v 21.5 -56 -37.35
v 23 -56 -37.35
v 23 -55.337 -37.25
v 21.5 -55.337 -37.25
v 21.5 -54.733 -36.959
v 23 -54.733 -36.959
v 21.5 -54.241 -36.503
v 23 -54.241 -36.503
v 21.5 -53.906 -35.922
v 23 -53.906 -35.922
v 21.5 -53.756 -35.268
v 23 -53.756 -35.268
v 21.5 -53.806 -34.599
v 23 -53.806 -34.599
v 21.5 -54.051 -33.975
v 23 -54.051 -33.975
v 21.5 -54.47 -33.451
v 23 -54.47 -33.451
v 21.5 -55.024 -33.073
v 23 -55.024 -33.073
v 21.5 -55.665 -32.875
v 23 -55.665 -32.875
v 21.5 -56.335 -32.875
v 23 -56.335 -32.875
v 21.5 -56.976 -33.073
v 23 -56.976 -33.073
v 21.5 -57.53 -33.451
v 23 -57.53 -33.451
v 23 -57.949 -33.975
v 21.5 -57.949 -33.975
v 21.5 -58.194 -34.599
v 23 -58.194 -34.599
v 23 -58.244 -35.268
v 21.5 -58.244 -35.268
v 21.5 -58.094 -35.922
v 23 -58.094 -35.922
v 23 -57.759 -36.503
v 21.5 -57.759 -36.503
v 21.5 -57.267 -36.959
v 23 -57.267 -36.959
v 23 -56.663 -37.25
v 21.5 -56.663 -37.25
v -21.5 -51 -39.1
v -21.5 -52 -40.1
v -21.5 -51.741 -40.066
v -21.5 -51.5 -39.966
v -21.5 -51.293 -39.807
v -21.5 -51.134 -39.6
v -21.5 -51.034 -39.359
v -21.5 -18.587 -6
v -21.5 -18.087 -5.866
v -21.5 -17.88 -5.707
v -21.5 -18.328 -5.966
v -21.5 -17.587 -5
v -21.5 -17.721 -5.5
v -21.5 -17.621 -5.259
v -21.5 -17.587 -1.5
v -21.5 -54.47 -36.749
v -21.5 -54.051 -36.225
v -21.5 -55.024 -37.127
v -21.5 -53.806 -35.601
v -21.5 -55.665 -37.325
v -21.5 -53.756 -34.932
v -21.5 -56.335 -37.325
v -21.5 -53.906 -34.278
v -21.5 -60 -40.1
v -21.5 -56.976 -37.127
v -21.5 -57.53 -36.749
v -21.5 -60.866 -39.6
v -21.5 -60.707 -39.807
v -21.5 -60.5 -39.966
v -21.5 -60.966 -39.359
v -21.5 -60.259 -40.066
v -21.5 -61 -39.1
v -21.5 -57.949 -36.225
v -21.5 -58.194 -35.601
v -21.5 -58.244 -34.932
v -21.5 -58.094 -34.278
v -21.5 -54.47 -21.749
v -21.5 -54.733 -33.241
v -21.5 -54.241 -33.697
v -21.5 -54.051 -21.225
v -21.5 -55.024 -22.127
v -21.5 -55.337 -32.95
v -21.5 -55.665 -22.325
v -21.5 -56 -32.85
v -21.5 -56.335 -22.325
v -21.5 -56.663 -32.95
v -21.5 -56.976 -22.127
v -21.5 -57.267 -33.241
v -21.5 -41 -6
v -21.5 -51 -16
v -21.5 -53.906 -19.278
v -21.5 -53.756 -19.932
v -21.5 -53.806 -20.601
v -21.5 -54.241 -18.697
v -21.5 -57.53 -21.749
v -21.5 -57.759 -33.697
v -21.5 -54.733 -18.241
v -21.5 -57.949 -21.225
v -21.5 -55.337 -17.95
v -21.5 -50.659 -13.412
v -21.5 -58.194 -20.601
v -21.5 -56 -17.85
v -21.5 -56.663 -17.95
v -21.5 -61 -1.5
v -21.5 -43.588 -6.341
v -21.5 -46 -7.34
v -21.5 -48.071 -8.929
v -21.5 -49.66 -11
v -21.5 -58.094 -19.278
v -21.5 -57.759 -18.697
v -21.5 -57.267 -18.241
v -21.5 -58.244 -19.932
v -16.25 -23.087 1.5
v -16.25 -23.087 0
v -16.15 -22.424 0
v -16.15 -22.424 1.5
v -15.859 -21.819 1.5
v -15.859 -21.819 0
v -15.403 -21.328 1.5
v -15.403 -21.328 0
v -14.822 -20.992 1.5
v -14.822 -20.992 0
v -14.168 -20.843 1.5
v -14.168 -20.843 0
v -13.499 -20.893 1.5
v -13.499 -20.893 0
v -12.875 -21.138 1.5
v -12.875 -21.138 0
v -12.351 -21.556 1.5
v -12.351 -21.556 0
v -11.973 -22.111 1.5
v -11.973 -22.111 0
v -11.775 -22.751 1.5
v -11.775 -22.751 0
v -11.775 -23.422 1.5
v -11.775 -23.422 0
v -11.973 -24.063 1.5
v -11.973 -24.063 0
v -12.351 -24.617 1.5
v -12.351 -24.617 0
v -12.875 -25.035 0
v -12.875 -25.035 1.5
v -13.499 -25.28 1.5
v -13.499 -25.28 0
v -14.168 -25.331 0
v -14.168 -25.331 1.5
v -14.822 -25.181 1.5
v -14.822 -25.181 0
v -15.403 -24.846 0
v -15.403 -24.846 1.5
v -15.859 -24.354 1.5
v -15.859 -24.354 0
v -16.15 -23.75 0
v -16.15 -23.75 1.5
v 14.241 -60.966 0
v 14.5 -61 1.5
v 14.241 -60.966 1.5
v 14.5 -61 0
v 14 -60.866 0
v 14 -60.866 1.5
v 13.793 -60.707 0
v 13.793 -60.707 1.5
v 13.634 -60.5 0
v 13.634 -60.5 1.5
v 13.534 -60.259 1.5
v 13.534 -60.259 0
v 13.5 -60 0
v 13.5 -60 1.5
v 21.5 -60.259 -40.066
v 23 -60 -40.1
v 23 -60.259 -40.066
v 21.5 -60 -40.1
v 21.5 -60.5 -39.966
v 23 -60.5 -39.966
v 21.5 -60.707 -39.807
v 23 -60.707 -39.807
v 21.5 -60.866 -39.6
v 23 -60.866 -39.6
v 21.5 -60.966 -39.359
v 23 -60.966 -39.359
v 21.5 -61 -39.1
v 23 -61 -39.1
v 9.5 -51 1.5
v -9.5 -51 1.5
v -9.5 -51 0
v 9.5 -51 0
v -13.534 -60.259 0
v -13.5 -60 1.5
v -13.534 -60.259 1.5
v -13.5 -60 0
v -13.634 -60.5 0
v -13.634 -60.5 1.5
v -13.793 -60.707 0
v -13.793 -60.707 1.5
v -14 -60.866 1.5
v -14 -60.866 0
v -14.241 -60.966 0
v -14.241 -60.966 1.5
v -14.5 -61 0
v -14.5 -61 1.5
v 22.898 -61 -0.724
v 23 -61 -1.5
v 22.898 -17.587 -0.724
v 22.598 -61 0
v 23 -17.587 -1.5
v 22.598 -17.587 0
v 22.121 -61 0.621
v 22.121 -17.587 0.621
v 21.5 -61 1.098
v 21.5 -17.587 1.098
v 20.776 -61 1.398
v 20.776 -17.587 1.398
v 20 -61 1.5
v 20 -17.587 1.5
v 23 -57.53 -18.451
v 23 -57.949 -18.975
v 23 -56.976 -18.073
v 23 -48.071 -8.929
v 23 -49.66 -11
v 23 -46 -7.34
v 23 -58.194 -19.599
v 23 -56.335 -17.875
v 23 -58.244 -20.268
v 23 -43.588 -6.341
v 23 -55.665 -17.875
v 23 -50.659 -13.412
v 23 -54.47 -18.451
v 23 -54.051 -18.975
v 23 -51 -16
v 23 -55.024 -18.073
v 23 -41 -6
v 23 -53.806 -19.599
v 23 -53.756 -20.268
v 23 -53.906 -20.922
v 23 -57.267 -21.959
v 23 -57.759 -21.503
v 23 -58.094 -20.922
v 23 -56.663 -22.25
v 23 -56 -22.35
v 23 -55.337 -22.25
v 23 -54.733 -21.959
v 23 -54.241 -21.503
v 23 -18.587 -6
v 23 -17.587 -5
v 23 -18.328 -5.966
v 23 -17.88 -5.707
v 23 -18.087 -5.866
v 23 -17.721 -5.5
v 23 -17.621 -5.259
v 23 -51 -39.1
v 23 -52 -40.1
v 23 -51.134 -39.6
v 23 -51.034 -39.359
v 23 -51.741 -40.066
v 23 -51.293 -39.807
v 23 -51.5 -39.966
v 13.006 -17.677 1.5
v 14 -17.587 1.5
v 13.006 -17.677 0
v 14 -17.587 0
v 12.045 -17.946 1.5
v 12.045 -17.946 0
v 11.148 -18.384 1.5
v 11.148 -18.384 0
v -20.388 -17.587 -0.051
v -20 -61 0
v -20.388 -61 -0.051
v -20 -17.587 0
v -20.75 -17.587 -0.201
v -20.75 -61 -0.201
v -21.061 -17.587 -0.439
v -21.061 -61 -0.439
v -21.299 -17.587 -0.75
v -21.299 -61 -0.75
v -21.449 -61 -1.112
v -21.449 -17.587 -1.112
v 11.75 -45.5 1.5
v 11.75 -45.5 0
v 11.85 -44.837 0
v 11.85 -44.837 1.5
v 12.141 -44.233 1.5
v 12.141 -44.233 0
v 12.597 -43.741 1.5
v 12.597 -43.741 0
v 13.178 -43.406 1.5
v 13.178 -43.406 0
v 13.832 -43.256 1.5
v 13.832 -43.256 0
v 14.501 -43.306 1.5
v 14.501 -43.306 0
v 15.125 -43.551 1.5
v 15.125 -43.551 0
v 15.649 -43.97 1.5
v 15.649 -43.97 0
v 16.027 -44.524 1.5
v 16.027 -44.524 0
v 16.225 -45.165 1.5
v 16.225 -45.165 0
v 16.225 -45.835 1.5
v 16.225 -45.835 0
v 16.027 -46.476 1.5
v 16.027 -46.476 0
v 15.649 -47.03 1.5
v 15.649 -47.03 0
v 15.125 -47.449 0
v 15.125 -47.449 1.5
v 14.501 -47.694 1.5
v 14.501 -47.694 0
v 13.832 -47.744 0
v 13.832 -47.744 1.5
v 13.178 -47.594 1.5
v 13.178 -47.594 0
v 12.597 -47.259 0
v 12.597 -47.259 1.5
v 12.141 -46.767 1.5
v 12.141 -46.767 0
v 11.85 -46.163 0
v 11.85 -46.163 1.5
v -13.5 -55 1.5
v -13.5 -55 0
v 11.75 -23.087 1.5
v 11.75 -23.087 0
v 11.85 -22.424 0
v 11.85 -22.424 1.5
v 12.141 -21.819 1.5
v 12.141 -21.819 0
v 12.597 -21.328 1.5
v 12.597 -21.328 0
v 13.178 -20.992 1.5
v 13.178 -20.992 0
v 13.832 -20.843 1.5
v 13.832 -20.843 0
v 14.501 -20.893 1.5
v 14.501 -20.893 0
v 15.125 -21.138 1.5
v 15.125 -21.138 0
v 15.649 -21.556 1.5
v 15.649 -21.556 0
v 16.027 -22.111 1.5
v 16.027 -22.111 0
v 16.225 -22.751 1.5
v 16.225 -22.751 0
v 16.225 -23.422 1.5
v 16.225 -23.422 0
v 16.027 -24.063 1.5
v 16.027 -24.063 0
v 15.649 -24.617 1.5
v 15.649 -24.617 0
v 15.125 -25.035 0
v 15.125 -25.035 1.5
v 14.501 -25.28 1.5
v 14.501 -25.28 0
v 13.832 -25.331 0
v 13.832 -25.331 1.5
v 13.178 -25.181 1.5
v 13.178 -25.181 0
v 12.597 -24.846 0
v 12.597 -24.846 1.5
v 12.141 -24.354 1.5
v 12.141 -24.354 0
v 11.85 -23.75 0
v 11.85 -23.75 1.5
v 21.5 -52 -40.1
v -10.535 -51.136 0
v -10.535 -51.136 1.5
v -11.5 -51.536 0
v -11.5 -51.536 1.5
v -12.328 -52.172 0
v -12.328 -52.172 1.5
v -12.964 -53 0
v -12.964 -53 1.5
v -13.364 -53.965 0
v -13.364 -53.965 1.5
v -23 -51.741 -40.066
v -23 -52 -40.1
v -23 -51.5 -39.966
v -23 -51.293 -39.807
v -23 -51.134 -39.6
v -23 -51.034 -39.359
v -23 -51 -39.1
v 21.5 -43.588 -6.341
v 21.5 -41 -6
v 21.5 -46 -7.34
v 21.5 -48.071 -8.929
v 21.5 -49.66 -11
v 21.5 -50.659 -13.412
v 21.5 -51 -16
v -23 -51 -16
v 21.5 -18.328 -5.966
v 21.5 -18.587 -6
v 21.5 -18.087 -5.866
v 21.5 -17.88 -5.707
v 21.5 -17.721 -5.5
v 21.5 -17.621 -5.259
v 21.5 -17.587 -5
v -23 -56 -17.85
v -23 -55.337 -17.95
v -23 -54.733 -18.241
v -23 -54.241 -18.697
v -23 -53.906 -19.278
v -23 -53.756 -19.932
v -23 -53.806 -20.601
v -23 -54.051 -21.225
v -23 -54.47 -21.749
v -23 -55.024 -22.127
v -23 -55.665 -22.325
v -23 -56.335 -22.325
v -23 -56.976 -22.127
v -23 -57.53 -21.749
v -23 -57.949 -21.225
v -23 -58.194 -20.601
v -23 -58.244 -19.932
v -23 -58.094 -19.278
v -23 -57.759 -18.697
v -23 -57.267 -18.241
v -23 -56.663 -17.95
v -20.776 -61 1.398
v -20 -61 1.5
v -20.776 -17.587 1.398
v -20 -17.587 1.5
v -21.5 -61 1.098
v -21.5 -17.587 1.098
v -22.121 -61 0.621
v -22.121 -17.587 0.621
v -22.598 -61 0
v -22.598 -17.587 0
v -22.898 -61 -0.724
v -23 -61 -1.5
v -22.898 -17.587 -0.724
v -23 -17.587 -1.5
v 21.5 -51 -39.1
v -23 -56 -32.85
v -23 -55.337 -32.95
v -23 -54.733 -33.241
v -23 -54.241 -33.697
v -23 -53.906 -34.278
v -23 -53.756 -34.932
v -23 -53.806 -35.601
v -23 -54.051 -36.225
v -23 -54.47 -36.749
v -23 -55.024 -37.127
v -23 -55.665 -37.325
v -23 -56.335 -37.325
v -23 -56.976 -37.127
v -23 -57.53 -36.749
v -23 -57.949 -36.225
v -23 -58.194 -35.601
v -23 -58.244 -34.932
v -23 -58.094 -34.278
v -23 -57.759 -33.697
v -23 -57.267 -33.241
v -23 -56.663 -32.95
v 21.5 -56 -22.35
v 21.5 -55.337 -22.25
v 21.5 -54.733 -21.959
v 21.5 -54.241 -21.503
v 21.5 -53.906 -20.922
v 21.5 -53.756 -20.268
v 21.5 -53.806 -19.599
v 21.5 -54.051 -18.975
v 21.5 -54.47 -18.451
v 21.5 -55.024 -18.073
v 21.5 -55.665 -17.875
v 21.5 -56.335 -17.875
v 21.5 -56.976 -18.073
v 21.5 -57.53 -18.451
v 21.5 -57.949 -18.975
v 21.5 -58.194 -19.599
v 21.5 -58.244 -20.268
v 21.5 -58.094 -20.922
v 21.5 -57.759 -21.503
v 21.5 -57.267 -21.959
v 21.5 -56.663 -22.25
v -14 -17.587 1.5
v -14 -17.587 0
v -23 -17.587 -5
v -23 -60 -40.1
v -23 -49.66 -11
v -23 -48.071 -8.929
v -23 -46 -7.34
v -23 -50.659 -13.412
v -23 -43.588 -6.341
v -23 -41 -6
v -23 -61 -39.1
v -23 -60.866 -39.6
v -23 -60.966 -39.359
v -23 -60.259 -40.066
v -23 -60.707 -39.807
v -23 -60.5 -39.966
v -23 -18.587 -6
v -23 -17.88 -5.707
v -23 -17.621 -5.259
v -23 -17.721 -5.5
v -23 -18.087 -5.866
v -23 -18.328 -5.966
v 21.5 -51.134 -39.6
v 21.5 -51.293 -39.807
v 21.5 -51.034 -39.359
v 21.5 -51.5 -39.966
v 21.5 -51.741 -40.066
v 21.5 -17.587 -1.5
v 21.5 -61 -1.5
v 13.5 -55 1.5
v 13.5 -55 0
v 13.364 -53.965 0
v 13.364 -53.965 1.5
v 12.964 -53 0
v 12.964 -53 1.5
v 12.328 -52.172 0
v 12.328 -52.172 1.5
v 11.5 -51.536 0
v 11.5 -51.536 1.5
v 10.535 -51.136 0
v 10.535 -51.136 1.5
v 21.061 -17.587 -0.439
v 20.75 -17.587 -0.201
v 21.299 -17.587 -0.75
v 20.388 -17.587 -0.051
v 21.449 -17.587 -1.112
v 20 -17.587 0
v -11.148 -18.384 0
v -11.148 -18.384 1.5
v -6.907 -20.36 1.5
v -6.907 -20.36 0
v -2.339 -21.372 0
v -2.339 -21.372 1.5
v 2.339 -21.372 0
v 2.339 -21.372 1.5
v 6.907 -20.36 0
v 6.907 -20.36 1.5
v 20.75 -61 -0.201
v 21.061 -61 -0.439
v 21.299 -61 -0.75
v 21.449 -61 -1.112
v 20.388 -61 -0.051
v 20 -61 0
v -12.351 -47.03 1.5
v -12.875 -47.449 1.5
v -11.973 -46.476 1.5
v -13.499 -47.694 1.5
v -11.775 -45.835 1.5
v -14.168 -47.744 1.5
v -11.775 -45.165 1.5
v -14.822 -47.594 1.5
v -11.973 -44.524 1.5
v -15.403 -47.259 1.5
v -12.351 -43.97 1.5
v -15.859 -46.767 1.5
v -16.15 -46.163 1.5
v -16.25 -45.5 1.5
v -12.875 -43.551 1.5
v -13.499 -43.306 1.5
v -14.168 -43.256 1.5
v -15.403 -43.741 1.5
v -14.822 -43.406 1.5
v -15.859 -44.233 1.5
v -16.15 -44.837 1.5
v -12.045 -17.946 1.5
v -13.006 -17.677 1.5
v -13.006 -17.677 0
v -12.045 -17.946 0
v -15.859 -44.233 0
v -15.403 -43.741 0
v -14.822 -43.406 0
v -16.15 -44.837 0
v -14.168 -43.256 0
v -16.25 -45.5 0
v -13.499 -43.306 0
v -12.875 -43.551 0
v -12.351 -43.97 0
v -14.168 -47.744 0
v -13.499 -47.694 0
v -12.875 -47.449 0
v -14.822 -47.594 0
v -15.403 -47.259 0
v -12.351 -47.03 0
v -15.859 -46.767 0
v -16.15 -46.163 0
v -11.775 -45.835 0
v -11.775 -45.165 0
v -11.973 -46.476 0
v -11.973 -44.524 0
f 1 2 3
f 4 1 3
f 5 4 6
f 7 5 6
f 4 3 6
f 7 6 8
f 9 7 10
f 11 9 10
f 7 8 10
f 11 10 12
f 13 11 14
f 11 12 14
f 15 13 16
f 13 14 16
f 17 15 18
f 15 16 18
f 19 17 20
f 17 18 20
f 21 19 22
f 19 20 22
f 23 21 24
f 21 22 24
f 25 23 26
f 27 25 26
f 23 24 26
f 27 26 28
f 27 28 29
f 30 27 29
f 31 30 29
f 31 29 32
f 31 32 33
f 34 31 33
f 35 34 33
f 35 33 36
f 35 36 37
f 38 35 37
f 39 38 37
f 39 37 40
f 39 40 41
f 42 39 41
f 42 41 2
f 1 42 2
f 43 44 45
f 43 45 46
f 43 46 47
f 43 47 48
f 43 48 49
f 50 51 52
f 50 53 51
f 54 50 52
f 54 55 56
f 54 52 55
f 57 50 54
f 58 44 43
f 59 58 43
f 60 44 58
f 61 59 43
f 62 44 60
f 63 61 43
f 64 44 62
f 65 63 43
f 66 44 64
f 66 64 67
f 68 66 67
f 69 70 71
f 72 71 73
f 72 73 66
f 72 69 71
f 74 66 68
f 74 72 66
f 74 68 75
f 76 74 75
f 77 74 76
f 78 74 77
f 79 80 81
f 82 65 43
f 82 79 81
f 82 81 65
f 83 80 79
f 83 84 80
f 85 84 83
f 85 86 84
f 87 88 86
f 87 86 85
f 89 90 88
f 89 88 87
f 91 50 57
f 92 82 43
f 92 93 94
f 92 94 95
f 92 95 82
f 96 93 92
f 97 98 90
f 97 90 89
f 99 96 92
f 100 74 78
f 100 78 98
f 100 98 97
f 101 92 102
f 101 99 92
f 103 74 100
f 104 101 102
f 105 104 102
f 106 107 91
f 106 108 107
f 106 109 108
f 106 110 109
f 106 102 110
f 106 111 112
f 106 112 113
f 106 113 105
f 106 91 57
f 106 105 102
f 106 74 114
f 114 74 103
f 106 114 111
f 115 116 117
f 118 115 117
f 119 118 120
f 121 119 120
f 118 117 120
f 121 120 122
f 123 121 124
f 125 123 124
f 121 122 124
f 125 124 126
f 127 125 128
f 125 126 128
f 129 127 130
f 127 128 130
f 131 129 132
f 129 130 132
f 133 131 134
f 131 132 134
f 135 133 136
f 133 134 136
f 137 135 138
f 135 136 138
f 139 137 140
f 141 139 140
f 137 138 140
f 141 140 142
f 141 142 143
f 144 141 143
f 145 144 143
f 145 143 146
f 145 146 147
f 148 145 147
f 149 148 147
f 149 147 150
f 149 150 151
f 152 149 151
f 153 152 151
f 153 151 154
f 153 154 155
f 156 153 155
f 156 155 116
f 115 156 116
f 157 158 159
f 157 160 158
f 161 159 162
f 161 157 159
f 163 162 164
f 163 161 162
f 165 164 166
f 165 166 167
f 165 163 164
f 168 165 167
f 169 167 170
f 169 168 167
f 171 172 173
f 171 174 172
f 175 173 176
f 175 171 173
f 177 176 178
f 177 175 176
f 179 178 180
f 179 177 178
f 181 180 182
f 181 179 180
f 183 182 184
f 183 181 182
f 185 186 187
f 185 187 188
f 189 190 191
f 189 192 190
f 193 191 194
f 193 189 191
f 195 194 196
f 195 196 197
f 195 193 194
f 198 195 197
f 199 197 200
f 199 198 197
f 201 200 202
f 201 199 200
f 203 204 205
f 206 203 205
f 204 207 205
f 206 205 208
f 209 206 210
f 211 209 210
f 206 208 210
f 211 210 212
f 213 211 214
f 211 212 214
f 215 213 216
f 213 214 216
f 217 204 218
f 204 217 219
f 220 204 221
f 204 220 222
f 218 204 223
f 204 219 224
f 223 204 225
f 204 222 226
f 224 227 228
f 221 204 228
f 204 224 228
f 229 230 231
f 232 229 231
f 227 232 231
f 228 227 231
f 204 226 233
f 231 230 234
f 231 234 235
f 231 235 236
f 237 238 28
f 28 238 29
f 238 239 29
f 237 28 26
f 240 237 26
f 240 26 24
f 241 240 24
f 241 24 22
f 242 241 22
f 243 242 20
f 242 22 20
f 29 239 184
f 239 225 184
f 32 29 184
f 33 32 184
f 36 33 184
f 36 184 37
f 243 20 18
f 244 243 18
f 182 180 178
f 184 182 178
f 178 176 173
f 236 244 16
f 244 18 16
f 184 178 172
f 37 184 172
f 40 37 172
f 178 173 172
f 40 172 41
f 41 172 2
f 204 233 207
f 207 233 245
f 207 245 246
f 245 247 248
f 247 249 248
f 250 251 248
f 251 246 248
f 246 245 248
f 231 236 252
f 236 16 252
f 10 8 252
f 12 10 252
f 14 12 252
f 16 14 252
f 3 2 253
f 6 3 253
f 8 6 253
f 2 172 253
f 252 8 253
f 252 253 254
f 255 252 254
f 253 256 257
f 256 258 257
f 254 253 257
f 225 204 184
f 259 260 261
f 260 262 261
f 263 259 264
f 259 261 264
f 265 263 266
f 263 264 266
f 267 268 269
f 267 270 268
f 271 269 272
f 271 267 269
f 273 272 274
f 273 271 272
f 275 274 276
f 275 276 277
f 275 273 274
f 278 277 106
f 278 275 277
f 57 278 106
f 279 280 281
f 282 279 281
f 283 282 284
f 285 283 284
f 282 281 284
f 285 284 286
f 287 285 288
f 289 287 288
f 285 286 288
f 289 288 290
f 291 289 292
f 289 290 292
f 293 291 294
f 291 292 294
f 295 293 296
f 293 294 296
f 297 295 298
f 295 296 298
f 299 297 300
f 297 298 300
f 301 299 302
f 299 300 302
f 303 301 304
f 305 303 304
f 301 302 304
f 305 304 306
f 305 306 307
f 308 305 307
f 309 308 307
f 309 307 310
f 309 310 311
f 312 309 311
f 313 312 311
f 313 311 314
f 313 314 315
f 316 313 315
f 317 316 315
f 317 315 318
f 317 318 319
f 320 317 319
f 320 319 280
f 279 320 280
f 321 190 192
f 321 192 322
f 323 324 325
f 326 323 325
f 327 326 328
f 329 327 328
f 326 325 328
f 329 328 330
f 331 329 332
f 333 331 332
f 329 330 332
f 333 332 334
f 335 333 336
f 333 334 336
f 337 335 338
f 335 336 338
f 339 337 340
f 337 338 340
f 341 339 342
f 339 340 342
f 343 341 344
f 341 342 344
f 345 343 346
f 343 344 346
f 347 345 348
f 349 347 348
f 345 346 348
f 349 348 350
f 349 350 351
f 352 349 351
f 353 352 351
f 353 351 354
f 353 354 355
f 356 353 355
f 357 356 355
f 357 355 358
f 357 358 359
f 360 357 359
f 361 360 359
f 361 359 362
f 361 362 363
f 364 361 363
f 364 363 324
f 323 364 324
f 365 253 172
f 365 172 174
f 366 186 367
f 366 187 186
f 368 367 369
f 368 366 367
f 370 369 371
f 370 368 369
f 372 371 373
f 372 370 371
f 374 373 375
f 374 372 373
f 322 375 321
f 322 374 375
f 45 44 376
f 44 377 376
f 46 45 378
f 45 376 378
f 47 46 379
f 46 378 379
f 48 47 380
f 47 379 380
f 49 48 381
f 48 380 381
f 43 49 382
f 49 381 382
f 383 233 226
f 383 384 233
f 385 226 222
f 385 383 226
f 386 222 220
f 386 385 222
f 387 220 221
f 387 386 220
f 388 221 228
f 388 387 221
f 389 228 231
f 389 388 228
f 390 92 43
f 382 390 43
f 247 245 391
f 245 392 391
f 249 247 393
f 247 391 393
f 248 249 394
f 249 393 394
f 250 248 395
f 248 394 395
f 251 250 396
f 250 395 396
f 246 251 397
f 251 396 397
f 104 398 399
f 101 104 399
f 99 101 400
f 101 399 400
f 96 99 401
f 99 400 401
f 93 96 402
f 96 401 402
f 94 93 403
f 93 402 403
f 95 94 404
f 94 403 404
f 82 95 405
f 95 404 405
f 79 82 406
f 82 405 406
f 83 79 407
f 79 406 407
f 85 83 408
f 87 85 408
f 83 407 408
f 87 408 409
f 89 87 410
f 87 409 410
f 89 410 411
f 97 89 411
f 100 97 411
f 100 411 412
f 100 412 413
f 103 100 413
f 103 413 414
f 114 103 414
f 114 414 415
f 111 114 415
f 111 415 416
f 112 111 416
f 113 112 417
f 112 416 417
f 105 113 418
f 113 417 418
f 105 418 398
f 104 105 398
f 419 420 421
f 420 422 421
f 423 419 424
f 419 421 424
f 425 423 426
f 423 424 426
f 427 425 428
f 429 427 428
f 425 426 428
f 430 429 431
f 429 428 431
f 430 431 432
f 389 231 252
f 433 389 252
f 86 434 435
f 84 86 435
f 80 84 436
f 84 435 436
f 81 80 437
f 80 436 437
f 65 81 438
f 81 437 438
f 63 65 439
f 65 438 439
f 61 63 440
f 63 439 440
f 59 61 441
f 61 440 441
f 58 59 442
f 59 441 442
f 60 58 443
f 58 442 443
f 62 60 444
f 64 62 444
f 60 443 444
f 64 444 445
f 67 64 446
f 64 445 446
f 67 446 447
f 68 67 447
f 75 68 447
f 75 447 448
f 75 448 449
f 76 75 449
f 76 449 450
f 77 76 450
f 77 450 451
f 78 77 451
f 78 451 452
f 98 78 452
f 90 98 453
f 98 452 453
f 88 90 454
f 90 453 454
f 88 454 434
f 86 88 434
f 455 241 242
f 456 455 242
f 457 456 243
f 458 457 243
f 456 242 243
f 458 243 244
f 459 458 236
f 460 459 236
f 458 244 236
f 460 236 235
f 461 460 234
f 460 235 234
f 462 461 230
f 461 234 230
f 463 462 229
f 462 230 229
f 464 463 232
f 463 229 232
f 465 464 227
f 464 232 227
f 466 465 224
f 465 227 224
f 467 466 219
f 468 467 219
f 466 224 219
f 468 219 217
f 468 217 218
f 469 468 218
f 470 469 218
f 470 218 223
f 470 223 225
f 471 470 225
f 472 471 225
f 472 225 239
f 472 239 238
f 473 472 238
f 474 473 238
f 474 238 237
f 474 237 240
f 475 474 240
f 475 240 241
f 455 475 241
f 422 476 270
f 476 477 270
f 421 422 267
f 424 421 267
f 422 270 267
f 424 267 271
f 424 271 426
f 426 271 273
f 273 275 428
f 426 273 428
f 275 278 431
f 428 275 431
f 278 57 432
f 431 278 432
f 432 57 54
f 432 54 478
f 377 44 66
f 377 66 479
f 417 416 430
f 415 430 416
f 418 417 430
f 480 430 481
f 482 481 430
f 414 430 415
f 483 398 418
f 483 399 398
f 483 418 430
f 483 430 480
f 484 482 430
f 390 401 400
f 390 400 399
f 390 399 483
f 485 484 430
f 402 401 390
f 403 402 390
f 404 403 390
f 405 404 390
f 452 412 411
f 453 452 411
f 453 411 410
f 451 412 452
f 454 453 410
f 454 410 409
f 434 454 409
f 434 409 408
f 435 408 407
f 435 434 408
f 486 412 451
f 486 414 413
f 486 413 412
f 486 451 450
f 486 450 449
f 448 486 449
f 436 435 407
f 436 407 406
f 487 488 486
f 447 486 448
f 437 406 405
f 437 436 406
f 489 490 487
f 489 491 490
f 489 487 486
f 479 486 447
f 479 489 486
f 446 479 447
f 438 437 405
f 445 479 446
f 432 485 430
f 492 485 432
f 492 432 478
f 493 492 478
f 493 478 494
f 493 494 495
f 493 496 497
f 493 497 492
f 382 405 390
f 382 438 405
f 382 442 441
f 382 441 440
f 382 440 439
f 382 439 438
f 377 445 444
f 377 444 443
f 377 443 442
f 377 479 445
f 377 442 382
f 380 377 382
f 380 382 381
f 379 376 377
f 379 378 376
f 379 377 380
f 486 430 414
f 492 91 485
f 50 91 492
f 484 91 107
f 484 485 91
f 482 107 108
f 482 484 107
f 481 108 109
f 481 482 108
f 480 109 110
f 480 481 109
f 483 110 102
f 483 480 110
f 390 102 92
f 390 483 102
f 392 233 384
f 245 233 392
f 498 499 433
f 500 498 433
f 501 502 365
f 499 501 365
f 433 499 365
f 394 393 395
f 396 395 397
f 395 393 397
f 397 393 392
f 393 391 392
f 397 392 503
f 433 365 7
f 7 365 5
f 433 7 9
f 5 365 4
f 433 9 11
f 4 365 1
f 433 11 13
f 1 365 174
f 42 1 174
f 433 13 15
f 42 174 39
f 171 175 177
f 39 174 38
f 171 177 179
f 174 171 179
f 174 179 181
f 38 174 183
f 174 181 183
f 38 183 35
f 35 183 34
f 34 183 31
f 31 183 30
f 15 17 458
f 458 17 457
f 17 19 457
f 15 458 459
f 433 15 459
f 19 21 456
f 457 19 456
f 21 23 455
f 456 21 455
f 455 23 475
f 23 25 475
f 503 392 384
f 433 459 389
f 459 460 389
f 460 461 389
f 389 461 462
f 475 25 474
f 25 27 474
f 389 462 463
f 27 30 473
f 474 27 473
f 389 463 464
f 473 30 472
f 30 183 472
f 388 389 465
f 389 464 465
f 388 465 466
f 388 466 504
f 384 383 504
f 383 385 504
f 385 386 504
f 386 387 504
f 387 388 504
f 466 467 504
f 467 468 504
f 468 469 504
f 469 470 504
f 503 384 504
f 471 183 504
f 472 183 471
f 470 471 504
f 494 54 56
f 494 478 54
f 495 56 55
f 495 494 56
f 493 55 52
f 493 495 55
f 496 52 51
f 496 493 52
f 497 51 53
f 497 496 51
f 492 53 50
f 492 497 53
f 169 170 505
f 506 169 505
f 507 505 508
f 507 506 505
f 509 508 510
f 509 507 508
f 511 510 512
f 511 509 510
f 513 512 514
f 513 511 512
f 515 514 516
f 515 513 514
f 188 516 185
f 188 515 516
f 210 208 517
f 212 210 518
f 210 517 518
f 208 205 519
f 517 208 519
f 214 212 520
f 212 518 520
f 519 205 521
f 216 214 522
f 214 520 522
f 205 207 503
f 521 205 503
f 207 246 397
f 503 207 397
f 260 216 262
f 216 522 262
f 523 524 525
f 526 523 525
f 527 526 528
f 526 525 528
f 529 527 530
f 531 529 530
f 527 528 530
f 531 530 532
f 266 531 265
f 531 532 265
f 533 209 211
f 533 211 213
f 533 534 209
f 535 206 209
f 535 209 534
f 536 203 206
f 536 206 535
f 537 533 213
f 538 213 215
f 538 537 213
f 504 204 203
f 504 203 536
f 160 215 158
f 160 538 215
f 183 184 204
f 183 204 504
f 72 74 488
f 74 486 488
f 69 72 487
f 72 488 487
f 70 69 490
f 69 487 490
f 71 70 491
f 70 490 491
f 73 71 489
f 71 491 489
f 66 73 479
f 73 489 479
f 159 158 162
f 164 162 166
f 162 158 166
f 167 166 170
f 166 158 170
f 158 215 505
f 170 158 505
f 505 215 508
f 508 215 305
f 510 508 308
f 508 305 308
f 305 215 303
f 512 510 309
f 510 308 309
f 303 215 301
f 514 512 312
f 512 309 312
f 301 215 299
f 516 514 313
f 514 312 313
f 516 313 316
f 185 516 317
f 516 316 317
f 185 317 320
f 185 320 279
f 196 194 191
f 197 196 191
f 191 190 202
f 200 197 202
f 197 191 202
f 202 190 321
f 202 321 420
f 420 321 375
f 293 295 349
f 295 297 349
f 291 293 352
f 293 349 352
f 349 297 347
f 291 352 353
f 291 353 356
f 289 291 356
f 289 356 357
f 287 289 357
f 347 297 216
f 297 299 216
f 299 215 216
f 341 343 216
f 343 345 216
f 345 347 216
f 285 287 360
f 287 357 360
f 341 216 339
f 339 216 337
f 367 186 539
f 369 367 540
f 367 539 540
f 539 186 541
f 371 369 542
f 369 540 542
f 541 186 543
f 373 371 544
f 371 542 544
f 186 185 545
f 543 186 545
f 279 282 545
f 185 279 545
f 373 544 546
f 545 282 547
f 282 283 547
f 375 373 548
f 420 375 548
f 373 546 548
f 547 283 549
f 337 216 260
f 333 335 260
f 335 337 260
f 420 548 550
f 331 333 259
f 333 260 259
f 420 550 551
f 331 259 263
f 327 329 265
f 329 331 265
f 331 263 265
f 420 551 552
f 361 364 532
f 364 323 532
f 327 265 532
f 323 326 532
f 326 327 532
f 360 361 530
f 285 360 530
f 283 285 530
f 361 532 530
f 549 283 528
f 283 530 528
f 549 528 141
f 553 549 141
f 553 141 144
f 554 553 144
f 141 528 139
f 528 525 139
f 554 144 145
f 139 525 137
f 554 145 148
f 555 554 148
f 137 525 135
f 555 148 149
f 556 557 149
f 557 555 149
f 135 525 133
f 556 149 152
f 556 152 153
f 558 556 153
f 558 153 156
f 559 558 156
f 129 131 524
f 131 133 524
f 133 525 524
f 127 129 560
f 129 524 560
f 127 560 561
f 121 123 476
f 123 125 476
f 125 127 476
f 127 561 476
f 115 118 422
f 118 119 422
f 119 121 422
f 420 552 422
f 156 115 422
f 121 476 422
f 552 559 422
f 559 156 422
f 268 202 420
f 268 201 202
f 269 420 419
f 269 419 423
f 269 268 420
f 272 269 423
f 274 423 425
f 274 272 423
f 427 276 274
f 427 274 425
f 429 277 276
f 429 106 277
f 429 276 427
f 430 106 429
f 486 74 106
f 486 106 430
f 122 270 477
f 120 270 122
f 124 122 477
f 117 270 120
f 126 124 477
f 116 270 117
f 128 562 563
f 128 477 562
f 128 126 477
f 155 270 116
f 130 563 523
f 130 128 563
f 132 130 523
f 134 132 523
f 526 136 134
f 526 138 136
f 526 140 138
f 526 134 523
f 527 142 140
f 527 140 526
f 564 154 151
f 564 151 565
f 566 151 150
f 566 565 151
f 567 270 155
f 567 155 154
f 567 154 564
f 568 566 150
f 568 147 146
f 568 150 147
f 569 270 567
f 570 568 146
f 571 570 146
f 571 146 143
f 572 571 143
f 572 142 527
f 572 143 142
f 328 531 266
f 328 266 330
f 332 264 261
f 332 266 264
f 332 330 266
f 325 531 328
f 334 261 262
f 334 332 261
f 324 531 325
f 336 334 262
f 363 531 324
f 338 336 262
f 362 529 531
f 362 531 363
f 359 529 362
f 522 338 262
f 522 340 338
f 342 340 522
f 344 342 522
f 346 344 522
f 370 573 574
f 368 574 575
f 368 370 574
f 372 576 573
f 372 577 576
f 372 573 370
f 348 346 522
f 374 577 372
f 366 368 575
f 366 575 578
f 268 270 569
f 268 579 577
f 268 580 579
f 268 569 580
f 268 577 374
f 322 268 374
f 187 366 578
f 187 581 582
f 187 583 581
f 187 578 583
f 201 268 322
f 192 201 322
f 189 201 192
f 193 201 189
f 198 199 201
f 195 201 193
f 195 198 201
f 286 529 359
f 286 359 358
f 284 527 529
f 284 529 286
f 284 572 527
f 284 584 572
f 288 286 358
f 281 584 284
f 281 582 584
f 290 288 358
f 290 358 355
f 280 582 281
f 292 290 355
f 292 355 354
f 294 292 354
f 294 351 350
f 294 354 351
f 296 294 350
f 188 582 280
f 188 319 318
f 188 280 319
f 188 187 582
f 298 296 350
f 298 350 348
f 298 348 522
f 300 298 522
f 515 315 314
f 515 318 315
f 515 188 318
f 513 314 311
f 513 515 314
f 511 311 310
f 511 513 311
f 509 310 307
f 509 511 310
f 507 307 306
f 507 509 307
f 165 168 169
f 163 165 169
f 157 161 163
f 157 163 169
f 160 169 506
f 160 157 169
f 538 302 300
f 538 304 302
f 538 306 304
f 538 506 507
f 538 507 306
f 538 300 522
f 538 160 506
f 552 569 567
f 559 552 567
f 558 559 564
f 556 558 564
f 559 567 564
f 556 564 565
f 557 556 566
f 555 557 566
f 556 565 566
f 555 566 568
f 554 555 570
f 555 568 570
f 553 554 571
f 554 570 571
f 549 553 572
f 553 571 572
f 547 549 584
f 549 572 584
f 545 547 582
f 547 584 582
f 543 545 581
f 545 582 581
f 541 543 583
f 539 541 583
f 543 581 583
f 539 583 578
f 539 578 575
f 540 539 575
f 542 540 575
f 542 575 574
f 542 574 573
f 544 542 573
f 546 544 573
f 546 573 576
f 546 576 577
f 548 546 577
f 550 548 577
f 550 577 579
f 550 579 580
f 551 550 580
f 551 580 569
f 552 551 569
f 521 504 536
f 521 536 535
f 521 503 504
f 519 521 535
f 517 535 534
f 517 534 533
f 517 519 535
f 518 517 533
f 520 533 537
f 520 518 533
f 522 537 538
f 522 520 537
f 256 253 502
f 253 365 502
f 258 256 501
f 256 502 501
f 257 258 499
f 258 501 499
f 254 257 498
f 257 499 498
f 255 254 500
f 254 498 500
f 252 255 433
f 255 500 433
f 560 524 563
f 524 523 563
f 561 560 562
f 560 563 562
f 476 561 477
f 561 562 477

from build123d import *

# Parameters (mm, degrees)
SKETCH_1_W                  = 46
SKETCH_1_H                  = 43.413207239
EXTRUDE_1_DEPTH             = 41.6
SKETCH_2_W                  = 43
SKETCH_2_H                  = 40.1
CUT_EXTRUDE_1_DEPTH         = 64.417005312
SKETCH_3_W                  = 27
SKETCH_3_H                  = 10
CUT_EXTRUDE_2_DEPTH         = 78.334080456
SKETCH_4_W                  = 34.1
SKETCH_4_H                  = 33.413207239
CUT_EXTRUDE_3_DEPTH         = 86.49421033
SKETCH_5_W                  = 34.1
SKETCH_5_H                  = 33.413207239
CUT_EXTRUDE_4_DEPTH         = 87.284471372
CUT_EXTRUDE_5_DEPTH         = 78.334080456
HOLE_WIZARD_4_5_4_5_1_D     = 4.5
HOLE_WIZARD_4_5_4_5_1_DEPTH = 1.5
HOLE_WIZARD_4_5_4_5_2_D     = 4.5
HOLE_WIZARD_4_5_4_5_3_D     = 4.5
HOLE_WIZARD_4_5_4_5_3_DEPTH = 41.6
FILLET_1_R                  = 1
FILLET_2_R                  = 1.5
FILLET_3_R                  = 3
FILLET_4_R                  = 4
FILLET_5_R                  = 5.5
FILLET_6_R                  = 10


with BuildPart() as part:
    # 草图1 → 凸台-拉伸1 (new body)
    with BuildSketch(Plane(origin=(0, 0, -40.1), x_dir=(-1, 0, 0), z_dir=(0, 0, -1))):
        with Locations((0, -39.293396381)):
            Rectangle(SKETCH_1_W, SKETCH_1_H)
    extrude(amount=-EXTRUDE_1_DEPTH)

    # 草图2 → 切除-拉伸1 (cut, through all)
    with BuildSketch(Plane.XZ.offset(61)):
        with Locations((0, -20.05)):
            Rectangle(SKETCH_2_W, SKETCH_2_H)
    extrude(amount=-CUT_EXTRUDE_1_DEPTH, mode=Mode.SUBTRACT)

    # 草图3 → 切除-拉伸2 (cut, through all)
    with BuildSketch(Plane.XY.offset(1.5)):
        with Locations((0, -56)):
            Rectangle(SKETCH_3_W, SKETCH_3_H)
    extrude(amount=-CUT_EXTRUDE_2_DEPTH, mode=Mode.SUBTRACT)

    # 草图4 → 切除-拉伸3 (cut, through all)
    with BuildSketch(Plane(origin=(-21.5, 0, 0), x_dir=(0, 0, -1), z_dir=(1, 0, 0))):
        with Locations((23.05, -34.29339638)):
            Rectangle(SKETCH_4_W, SKETCH_4_H)
    extrude(amount=-CUT_EXTRUDE_3_DEPTH, mode=Mode.SUBTRACT)

    # 草图5 → 切除-拉伸4 (cut, through all)
    with BuildSketch(Plane(origin=(23, 0, 0), x_dir=(0, 0, -1), z_dir=(1, 0, 0))):
        with Locations((23.05, -34.29339638)):
            Rectangle(SKETCH_5_W, SKETCH_5_H)
    extrude(amount=-CUT_EXTRUDE_4_DEPTH, mode=Mode.SUBTRACT)

    # 草图6 → 切除-拉伸5 (cut, through all)
    with BuildSketch(Plane.XY.offset(1.5)):
        with BuildLine():
            Line((12.367486421, -17.586792761), (-12.367486421, -17.586792761))
            ThreePointArc((-12.367486421, -17.586792761), (0, -21.5), (12.367486421, -17.586792761))
        make_face()
    extrude(amount=-CUT_EXTRUDE_5_DEPTH, mode=Mode.SUBTRACT)

    # Ø4.5 (4.5) 直径孔1
    with Locations(Plane(origin=(-21.5, 0, 0), x_dir=(0, 0, -1), z_dir=(1, 0, 0))):
        with Locations((20.1, -56), (35.1, -56)):
            Hole(HOLE_WIZARD_4_5_4_5_1_D / 2, depth=HOLE_WIZARD_4_5_4_5_1_DEPTH)

    # Ø4.5 (4.5) 直径孔2 (through all)
    with Locations(Plane.ZY.offset(-21.5)):
        with Locations((-20.1, -56), (-35.1, -56)):
            Hole(HOLE_WIZARD_4_5_4_5_2_D / 2)

    # Ø4.5 (4.5) 直径孔3
    with Locations(Plane.XY.offset(1.5)):
        with Locations((-14, -45.5), (-14, -23.086792761), (14, -23.086792761), (14, -45.5)):
            Hole(HOLE_WIZARD_4_5_4_5_3_D / 2, depth=HOLE_WIZARD_4_5_4_5_3_DEPTH)

    # 圆角1
    fillet_1_edges = [part.edges().sort_by_distance(p)[0] for p in [
        (-22.25, -61, -40.1),
        (-13.5, -61, 0.75),
        (13.5, -61, 0.75),
        (22.25, -61, -40.1),
        (-22.25, -51, -40.1),
        (-22.25, -17.586792761, -6),
        (22.25, -51, -40.1),
        (22.25, -17.586792761, -6),
    ]]
    fillet(fillet_1_edges, radius=FILLET_1_R)

    # 圆角2
    fillet_2_edges = [part.edges().sort_by_distance(p)[0] for p in [
        (-21.5, -39.293396381, 0),
        (21.5, -39.293396381, 0),
    ]]
    fillet(fillet_2_edges, radius=FILLET_2_R)

    # 圆角3
    fillet_3_edges = [part.edges().sort_by_distance(p)[0] for p in [
        (-23, -39.293396381, 1.5),
        (23, -39.293396381, 1.5),
    ]]
    fillet(fillet_3_edges, radius=FILLET_3_R)

    # 圆角4
    fillet_4_edges = [part.edges().sort_by_distance(p)[0] for p in [
        (-13.5, -51, 0.75),
        (13.5, -51, 0.75),
    ]]
    fillet(fillet_4_edges, radius=FILLET_4_R)

    # 圆角5
    fillet_5_edges = [part.edges().sort_by_distance(p)[0] for p in [
        (12.367486421, -17.586792761, 0.75),
        (-12.367486421, -17.586792761, 0.75),
    ]]
    fillet(fillet_5_edges, radius=FILLET_5_R)

    # 圆角6
    fillet_6_edges = [part.edges().sort_by_distance(p)[0] for p in [
        (-22.25, -51, -6),
        (22.25, -51, -6),
    ]]
    fillet(fillet_6_edges, radius=FILLET_6_R)


solid = part.part
